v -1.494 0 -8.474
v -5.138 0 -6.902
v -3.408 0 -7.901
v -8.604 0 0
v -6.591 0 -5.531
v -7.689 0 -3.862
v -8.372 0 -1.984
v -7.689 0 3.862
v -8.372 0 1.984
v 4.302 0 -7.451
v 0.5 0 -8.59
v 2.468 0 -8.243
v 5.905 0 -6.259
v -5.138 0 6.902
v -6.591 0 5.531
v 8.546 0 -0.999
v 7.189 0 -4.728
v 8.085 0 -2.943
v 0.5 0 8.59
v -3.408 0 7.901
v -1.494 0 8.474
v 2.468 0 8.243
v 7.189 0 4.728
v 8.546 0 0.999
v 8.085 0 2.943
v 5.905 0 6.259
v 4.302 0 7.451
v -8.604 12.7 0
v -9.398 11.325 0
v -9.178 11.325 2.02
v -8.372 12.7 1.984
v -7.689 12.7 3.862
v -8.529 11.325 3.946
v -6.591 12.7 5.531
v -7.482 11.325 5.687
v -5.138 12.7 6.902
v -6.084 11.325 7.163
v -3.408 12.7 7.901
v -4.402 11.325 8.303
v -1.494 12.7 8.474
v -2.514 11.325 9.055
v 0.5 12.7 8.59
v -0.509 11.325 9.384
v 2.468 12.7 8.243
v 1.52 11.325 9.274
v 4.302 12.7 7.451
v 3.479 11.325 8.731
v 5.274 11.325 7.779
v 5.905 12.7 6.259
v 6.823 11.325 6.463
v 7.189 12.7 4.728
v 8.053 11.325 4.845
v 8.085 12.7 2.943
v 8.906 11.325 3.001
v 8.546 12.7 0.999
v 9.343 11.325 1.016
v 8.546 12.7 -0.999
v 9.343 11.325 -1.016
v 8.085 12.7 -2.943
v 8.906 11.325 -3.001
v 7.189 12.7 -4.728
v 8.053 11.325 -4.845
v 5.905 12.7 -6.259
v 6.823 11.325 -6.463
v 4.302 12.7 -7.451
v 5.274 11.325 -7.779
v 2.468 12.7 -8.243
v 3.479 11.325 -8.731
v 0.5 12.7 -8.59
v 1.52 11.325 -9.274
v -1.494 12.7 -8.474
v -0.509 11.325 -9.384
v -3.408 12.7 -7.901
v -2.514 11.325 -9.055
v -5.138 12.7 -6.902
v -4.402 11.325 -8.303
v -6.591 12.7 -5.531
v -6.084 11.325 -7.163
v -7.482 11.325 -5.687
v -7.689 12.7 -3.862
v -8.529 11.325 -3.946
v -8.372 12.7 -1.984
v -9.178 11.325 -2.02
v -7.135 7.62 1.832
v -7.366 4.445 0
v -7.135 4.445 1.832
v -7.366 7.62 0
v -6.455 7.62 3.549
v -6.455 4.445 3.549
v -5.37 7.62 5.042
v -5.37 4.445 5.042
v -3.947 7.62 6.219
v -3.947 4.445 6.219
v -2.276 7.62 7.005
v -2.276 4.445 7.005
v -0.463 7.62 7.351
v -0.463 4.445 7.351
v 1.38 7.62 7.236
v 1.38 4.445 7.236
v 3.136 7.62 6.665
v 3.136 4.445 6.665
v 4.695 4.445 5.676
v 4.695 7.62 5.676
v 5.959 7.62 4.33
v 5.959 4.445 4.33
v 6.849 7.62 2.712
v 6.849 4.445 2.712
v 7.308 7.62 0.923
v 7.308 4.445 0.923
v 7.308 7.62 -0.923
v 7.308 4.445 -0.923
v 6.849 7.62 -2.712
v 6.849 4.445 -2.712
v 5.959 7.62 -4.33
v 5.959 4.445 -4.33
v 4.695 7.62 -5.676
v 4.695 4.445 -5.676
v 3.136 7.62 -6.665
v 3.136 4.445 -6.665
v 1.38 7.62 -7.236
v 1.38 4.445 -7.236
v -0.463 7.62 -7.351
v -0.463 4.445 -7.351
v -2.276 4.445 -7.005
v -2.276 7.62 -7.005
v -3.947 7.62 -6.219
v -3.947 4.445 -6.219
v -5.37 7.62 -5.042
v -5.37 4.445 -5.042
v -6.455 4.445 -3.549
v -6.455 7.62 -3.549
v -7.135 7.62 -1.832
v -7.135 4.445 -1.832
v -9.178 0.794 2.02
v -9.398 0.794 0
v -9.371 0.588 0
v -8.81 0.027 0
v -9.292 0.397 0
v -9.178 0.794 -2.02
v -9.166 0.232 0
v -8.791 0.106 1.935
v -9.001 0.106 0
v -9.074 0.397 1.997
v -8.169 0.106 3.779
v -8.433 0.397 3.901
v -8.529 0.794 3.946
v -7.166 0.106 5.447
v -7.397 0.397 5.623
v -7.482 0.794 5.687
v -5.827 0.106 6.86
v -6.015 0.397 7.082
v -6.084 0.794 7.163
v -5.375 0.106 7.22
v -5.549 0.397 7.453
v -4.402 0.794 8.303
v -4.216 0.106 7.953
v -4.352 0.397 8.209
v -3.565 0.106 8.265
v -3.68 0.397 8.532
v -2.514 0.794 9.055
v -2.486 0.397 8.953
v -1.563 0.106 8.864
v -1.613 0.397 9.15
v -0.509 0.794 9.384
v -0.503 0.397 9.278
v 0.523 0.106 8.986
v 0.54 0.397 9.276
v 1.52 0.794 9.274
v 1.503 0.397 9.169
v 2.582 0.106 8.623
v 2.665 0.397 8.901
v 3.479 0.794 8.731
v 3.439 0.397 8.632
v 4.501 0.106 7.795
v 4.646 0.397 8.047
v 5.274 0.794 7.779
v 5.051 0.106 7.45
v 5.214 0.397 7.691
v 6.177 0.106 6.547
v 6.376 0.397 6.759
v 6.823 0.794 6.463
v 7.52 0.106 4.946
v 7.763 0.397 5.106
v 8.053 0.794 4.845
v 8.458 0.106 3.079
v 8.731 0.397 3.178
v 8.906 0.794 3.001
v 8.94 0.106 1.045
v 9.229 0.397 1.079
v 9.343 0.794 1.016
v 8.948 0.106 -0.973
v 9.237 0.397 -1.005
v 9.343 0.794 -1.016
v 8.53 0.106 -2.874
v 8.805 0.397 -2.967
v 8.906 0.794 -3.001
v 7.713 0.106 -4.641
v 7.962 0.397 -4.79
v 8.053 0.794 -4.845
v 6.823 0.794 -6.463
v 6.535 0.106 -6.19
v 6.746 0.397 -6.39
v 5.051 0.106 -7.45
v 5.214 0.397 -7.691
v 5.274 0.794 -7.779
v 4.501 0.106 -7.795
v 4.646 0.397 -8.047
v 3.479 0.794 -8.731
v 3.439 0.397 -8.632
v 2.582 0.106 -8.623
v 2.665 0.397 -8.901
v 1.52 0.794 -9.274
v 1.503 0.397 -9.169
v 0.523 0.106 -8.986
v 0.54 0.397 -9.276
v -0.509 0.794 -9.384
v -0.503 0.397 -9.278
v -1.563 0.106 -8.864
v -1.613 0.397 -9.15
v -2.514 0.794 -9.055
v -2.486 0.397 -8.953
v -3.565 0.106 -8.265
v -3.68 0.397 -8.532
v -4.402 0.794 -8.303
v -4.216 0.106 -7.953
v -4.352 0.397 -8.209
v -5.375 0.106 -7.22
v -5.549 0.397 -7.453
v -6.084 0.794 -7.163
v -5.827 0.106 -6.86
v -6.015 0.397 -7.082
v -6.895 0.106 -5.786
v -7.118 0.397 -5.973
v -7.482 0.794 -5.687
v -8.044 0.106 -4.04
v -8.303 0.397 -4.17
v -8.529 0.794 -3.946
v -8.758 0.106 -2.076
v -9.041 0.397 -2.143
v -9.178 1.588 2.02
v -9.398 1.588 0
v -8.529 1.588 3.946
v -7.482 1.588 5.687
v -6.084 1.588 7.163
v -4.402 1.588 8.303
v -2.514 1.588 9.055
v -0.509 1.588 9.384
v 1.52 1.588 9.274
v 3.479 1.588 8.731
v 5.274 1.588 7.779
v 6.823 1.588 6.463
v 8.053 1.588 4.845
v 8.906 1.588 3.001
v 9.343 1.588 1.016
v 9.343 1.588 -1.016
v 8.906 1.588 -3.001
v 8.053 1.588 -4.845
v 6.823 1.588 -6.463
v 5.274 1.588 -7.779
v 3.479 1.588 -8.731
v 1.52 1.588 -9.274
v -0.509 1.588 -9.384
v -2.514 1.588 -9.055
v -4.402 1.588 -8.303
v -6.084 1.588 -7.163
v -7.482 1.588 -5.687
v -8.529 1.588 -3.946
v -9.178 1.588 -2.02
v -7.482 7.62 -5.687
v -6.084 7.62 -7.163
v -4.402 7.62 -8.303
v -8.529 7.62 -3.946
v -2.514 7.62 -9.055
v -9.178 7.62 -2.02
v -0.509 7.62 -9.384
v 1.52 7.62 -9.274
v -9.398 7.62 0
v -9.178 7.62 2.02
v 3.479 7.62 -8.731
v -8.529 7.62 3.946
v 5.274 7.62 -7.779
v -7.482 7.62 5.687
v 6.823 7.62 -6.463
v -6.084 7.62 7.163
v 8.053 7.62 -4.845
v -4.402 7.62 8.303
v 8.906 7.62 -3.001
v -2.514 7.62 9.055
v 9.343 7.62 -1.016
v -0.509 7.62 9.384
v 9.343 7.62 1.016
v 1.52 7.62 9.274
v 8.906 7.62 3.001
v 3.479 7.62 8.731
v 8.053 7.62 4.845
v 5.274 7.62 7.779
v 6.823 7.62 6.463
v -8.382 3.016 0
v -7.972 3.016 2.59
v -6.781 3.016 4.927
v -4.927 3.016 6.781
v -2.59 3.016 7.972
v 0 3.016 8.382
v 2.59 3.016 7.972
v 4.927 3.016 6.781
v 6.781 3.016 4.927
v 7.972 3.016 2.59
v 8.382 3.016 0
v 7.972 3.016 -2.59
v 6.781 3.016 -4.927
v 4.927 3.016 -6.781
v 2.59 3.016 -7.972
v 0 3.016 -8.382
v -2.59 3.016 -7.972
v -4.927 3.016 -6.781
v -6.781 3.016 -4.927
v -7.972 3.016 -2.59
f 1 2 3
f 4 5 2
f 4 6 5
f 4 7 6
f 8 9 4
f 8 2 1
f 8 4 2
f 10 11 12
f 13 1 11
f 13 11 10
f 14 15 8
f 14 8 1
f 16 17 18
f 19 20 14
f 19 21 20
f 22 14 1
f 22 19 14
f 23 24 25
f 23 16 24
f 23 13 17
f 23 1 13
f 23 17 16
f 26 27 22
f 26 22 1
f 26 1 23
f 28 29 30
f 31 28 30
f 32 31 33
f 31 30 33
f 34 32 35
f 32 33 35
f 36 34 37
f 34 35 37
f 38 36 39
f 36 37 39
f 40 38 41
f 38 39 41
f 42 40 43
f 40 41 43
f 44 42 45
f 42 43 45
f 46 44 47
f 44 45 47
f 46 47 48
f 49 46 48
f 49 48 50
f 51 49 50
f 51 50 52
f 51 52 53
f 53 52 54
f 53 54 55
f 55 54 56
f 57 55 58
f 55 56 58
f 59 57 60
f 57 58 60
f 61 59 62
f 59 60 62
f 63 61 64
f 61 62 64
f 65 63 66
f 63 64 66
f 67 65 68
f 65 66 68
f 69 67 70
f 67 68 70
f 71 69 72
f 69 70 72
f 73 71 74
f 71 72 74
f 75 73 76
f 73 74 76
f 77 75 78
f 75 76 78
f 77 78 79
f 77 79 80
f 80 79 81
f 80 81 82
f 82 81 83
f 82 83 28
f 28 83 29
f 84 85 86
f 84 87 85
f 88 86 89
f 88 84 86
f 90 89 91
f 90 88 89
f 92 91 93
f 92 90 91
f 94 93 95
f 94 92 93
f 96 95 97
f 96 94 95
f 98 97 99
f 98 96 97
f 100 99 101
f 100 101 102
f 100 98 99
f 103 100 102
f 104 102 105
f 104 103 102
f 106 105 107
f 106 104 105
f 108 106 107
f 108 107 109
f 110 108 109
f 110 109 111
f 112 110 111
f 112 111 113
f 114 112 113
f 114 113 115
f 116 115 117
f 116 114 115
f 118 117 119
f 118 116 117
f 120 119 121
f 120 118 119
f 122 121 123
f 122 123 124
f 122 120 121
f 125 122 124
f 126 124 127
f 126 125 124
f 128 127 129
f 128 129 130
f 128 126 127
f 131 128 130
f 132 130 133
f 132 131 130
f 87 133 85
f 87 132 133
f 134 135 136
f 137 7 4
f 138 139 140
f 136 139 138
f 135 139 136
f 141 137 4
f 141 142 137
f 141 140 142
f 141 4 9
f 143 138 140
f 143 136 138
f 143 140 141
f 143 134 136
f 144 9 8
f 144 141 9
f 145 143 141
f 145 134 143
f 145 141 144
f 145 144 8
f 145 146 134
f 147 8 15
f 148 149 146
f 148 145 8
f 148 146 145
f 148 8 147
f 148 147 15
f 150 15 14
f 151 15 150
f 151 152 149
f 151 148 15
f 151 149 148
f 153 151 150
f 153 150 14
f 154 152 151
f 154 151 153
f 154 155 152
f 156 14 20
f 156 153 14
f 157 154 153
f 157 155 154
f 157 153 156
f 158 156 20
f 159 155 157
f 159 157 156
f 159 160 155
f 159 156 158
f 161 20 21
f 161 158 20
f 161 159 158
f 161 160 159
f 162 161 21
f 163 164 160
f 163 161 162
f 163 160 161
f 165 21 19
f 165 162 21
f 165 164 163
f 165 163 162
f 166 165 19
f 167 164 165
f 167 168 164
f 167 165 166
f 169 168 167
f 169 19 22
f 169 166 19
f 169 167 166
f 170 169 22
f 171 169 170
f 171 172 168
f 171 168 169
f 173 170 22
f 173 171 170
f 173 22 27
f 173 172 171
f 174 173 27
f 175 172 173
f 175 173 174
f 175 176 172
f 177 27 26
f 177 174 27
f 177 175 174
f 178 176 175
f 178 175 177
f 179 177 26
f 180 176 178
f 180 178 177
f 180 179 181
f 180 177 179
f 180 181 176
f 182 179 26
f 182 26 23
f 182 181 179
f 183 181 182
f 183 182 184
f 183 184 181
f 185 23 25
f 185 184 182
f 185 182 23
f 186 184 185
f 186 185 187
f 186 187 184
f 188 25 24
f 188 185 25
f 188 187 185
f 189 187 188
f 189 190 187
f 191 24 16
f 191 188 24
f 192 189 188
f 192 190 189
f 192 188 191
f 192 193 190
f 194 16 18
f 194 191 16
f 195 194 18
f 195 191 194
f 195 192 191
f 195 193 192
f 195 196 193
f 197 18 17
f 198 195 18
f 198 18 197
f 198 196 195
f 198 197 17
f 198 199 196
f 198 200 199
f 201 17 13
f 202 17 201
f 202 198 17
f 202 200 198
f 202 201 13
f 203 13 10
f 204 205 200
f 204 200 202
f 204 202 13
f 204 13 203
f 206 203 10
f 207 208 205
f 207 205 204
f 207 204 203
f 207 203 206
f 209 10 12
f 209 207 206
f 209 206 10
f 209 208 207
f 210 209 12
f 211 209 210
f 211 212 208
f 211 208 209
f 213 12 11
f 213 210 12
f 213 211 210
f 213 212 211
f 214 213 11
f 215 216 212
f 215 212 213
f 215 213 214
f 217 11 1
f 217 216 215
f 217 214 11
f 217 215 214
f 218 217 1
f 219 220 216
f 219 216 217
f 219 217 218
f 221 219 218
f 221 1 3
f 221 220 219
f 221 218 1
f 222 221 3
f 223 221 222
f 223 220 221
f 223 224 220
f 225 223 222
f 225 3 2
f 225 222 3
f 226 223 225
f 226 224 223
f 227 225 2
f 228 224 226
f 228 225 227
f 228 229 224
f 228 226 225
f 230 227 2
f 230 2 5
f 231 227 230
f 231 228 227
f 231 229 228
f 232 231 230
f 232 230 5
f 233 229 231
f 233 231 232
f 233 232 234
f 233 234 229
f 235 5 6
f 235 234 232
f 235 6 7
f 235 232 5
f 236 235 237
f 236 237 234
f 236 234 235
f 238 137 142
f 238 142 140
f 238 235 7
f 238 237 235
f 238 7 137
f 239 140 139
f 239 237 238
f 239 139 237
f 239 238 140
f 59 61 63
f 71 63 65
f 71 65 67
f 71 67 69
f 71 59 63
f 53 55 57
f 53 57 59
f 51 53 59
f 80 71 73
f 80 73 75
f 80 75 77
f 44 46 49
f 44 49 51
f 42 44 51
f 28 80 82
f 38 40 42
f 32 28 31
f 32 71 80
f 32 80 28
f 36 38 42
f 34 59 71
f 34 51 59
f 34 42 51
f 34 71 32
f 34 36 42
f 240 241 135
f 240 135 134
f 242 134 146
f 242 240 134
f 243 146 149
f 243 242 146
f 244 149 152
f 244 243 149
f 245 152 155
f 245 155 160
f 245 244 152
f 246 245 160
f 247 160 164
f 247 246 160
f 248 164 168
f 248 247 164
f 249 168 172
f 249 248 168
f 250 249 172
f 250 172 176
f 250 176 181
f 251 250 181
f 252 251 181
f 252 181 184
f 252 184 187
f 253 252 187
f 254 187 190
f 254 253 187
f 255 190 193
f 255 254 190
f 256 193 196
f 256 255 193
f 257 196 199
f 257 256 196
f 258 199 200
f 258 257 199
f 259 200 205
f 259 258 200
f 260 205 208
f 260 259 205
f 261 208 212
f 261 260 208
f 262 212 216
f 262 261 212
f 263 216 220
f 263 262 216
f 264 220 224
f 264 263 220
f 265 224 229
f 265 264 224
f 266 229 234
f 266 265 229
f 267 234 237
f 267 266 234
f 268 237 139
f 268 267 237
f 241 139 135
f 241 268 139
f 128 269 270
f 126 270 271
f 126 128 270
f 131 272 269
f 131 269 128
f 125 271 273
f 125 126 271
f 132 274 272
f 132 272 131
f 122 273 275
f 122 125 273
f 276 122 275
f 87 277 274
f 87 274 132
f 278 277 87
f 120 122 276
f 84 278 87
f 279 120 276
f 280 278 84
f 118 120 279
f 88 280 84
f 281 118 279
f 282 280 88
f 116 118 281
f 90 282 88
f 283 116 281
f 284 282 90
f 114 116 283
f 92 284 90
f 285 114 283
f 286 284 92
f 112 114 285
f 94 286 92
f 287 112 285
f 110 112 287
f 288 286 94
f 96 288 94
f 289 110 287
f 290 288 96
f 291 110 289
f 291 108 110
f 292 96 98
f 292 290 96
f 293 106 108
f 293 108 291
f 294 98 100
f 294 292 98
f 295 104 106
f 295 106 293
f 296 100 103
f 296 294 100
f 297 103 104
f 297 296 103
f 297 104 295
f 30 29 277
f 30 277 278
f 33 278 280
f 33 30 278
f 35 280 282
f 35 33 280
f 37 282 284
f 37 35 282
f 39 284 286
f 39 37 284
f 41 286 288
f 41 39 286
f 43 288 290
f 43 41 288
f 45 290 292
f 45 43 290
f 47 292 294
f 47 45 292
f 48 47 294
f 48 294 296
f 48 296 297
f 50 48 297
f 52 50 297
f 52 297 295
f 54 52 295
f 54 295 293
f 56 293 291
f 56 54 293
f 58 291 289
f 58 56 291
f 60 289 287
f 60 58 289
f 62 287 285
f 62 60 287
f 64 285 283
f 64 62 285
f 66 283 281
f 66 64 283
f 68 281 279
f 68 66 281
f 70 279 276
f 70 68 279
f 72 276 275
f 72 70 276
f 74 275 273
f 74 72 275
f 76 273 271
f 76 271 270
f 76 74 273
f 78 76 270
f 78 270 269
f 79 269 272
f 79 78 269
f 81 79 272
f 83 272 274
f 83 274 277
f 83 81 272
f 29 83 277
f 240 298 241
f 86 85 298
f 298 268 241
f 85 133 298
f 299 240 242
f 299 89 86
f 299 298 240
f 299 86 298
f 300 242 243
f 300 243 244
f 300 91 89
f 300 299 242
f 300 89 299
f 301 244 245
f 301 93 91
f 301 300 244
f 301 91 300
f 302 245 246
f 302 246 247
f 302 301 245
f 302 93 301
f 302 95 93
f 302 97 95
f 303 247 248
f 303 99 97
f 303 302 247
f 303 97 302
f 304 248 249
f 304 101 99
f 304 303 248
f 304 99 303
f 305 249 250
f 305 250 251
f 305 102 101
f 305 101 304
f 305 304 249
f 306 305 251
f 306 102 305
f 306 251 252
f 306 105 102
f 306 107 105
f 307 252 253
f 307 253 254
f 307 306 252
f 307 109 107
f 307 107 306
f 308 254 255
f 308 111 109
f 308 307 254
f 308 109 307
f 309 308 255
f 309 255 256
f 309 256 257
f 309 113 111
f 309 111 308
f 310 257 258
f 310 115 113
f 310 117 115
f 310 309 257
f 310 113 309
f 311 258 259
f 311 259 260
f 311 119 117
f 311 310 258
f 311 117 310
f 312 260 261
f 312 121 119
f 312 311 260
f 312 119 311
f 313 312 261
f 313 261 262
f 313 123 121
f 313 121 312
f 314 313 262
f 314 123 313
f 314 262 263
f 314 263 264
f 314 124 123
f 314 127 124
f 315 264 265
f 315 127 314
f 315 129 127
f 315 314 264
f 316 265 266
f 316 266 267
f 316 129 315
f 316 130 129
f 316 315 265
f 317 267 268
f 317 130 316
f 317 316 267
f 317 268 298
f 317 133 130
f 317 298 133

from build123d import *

# Parameters (mm, degrees)
FILLET1_R      = 0.79375
CHAMFER1_SIZE  = 0.79375
CHAMFER1_SIZE2 = 1.374815329


with BuildPart() as part:
    # Sketch1 → Revolve1 (revolve)
    with BuildSketch(Plane.XY):
        Polygon((0, 0), (-9.398, 0), (-9.398, 1.5875), (-7.366, 4.445), (-7.366, 7.62), (-9.398, 7.62), (-9.398, 12.7), (0, 12.7), align=None)
    revolve(axis=Axis((0, 0, 0), (0, 1, 0)))

    # Fillet1
    fillet1_edges = [part.edges().sort_by_distance(p)[0] for p in [
        (9.398, 0, 0),
    ]]
    fillet(fillet1_edges, radius=FILLET1_R)

    # Chamfer1
    chamfer1_edges = [part.edges().sort_by_distance(p)[0] for p in [
        (9.398, 12.7, 0),
    ]]
    chamfer1_side = [part.faces().sort_by_distance(p)[0] for p in [
        (0, 12.7, 0),
    ]]
    chamfer(chamfer1_edges, length=CHAMFER1_SIZE, length2=CHAMFER1_SIZE2, reference=chamfer1_side[0])


solid = part.part
